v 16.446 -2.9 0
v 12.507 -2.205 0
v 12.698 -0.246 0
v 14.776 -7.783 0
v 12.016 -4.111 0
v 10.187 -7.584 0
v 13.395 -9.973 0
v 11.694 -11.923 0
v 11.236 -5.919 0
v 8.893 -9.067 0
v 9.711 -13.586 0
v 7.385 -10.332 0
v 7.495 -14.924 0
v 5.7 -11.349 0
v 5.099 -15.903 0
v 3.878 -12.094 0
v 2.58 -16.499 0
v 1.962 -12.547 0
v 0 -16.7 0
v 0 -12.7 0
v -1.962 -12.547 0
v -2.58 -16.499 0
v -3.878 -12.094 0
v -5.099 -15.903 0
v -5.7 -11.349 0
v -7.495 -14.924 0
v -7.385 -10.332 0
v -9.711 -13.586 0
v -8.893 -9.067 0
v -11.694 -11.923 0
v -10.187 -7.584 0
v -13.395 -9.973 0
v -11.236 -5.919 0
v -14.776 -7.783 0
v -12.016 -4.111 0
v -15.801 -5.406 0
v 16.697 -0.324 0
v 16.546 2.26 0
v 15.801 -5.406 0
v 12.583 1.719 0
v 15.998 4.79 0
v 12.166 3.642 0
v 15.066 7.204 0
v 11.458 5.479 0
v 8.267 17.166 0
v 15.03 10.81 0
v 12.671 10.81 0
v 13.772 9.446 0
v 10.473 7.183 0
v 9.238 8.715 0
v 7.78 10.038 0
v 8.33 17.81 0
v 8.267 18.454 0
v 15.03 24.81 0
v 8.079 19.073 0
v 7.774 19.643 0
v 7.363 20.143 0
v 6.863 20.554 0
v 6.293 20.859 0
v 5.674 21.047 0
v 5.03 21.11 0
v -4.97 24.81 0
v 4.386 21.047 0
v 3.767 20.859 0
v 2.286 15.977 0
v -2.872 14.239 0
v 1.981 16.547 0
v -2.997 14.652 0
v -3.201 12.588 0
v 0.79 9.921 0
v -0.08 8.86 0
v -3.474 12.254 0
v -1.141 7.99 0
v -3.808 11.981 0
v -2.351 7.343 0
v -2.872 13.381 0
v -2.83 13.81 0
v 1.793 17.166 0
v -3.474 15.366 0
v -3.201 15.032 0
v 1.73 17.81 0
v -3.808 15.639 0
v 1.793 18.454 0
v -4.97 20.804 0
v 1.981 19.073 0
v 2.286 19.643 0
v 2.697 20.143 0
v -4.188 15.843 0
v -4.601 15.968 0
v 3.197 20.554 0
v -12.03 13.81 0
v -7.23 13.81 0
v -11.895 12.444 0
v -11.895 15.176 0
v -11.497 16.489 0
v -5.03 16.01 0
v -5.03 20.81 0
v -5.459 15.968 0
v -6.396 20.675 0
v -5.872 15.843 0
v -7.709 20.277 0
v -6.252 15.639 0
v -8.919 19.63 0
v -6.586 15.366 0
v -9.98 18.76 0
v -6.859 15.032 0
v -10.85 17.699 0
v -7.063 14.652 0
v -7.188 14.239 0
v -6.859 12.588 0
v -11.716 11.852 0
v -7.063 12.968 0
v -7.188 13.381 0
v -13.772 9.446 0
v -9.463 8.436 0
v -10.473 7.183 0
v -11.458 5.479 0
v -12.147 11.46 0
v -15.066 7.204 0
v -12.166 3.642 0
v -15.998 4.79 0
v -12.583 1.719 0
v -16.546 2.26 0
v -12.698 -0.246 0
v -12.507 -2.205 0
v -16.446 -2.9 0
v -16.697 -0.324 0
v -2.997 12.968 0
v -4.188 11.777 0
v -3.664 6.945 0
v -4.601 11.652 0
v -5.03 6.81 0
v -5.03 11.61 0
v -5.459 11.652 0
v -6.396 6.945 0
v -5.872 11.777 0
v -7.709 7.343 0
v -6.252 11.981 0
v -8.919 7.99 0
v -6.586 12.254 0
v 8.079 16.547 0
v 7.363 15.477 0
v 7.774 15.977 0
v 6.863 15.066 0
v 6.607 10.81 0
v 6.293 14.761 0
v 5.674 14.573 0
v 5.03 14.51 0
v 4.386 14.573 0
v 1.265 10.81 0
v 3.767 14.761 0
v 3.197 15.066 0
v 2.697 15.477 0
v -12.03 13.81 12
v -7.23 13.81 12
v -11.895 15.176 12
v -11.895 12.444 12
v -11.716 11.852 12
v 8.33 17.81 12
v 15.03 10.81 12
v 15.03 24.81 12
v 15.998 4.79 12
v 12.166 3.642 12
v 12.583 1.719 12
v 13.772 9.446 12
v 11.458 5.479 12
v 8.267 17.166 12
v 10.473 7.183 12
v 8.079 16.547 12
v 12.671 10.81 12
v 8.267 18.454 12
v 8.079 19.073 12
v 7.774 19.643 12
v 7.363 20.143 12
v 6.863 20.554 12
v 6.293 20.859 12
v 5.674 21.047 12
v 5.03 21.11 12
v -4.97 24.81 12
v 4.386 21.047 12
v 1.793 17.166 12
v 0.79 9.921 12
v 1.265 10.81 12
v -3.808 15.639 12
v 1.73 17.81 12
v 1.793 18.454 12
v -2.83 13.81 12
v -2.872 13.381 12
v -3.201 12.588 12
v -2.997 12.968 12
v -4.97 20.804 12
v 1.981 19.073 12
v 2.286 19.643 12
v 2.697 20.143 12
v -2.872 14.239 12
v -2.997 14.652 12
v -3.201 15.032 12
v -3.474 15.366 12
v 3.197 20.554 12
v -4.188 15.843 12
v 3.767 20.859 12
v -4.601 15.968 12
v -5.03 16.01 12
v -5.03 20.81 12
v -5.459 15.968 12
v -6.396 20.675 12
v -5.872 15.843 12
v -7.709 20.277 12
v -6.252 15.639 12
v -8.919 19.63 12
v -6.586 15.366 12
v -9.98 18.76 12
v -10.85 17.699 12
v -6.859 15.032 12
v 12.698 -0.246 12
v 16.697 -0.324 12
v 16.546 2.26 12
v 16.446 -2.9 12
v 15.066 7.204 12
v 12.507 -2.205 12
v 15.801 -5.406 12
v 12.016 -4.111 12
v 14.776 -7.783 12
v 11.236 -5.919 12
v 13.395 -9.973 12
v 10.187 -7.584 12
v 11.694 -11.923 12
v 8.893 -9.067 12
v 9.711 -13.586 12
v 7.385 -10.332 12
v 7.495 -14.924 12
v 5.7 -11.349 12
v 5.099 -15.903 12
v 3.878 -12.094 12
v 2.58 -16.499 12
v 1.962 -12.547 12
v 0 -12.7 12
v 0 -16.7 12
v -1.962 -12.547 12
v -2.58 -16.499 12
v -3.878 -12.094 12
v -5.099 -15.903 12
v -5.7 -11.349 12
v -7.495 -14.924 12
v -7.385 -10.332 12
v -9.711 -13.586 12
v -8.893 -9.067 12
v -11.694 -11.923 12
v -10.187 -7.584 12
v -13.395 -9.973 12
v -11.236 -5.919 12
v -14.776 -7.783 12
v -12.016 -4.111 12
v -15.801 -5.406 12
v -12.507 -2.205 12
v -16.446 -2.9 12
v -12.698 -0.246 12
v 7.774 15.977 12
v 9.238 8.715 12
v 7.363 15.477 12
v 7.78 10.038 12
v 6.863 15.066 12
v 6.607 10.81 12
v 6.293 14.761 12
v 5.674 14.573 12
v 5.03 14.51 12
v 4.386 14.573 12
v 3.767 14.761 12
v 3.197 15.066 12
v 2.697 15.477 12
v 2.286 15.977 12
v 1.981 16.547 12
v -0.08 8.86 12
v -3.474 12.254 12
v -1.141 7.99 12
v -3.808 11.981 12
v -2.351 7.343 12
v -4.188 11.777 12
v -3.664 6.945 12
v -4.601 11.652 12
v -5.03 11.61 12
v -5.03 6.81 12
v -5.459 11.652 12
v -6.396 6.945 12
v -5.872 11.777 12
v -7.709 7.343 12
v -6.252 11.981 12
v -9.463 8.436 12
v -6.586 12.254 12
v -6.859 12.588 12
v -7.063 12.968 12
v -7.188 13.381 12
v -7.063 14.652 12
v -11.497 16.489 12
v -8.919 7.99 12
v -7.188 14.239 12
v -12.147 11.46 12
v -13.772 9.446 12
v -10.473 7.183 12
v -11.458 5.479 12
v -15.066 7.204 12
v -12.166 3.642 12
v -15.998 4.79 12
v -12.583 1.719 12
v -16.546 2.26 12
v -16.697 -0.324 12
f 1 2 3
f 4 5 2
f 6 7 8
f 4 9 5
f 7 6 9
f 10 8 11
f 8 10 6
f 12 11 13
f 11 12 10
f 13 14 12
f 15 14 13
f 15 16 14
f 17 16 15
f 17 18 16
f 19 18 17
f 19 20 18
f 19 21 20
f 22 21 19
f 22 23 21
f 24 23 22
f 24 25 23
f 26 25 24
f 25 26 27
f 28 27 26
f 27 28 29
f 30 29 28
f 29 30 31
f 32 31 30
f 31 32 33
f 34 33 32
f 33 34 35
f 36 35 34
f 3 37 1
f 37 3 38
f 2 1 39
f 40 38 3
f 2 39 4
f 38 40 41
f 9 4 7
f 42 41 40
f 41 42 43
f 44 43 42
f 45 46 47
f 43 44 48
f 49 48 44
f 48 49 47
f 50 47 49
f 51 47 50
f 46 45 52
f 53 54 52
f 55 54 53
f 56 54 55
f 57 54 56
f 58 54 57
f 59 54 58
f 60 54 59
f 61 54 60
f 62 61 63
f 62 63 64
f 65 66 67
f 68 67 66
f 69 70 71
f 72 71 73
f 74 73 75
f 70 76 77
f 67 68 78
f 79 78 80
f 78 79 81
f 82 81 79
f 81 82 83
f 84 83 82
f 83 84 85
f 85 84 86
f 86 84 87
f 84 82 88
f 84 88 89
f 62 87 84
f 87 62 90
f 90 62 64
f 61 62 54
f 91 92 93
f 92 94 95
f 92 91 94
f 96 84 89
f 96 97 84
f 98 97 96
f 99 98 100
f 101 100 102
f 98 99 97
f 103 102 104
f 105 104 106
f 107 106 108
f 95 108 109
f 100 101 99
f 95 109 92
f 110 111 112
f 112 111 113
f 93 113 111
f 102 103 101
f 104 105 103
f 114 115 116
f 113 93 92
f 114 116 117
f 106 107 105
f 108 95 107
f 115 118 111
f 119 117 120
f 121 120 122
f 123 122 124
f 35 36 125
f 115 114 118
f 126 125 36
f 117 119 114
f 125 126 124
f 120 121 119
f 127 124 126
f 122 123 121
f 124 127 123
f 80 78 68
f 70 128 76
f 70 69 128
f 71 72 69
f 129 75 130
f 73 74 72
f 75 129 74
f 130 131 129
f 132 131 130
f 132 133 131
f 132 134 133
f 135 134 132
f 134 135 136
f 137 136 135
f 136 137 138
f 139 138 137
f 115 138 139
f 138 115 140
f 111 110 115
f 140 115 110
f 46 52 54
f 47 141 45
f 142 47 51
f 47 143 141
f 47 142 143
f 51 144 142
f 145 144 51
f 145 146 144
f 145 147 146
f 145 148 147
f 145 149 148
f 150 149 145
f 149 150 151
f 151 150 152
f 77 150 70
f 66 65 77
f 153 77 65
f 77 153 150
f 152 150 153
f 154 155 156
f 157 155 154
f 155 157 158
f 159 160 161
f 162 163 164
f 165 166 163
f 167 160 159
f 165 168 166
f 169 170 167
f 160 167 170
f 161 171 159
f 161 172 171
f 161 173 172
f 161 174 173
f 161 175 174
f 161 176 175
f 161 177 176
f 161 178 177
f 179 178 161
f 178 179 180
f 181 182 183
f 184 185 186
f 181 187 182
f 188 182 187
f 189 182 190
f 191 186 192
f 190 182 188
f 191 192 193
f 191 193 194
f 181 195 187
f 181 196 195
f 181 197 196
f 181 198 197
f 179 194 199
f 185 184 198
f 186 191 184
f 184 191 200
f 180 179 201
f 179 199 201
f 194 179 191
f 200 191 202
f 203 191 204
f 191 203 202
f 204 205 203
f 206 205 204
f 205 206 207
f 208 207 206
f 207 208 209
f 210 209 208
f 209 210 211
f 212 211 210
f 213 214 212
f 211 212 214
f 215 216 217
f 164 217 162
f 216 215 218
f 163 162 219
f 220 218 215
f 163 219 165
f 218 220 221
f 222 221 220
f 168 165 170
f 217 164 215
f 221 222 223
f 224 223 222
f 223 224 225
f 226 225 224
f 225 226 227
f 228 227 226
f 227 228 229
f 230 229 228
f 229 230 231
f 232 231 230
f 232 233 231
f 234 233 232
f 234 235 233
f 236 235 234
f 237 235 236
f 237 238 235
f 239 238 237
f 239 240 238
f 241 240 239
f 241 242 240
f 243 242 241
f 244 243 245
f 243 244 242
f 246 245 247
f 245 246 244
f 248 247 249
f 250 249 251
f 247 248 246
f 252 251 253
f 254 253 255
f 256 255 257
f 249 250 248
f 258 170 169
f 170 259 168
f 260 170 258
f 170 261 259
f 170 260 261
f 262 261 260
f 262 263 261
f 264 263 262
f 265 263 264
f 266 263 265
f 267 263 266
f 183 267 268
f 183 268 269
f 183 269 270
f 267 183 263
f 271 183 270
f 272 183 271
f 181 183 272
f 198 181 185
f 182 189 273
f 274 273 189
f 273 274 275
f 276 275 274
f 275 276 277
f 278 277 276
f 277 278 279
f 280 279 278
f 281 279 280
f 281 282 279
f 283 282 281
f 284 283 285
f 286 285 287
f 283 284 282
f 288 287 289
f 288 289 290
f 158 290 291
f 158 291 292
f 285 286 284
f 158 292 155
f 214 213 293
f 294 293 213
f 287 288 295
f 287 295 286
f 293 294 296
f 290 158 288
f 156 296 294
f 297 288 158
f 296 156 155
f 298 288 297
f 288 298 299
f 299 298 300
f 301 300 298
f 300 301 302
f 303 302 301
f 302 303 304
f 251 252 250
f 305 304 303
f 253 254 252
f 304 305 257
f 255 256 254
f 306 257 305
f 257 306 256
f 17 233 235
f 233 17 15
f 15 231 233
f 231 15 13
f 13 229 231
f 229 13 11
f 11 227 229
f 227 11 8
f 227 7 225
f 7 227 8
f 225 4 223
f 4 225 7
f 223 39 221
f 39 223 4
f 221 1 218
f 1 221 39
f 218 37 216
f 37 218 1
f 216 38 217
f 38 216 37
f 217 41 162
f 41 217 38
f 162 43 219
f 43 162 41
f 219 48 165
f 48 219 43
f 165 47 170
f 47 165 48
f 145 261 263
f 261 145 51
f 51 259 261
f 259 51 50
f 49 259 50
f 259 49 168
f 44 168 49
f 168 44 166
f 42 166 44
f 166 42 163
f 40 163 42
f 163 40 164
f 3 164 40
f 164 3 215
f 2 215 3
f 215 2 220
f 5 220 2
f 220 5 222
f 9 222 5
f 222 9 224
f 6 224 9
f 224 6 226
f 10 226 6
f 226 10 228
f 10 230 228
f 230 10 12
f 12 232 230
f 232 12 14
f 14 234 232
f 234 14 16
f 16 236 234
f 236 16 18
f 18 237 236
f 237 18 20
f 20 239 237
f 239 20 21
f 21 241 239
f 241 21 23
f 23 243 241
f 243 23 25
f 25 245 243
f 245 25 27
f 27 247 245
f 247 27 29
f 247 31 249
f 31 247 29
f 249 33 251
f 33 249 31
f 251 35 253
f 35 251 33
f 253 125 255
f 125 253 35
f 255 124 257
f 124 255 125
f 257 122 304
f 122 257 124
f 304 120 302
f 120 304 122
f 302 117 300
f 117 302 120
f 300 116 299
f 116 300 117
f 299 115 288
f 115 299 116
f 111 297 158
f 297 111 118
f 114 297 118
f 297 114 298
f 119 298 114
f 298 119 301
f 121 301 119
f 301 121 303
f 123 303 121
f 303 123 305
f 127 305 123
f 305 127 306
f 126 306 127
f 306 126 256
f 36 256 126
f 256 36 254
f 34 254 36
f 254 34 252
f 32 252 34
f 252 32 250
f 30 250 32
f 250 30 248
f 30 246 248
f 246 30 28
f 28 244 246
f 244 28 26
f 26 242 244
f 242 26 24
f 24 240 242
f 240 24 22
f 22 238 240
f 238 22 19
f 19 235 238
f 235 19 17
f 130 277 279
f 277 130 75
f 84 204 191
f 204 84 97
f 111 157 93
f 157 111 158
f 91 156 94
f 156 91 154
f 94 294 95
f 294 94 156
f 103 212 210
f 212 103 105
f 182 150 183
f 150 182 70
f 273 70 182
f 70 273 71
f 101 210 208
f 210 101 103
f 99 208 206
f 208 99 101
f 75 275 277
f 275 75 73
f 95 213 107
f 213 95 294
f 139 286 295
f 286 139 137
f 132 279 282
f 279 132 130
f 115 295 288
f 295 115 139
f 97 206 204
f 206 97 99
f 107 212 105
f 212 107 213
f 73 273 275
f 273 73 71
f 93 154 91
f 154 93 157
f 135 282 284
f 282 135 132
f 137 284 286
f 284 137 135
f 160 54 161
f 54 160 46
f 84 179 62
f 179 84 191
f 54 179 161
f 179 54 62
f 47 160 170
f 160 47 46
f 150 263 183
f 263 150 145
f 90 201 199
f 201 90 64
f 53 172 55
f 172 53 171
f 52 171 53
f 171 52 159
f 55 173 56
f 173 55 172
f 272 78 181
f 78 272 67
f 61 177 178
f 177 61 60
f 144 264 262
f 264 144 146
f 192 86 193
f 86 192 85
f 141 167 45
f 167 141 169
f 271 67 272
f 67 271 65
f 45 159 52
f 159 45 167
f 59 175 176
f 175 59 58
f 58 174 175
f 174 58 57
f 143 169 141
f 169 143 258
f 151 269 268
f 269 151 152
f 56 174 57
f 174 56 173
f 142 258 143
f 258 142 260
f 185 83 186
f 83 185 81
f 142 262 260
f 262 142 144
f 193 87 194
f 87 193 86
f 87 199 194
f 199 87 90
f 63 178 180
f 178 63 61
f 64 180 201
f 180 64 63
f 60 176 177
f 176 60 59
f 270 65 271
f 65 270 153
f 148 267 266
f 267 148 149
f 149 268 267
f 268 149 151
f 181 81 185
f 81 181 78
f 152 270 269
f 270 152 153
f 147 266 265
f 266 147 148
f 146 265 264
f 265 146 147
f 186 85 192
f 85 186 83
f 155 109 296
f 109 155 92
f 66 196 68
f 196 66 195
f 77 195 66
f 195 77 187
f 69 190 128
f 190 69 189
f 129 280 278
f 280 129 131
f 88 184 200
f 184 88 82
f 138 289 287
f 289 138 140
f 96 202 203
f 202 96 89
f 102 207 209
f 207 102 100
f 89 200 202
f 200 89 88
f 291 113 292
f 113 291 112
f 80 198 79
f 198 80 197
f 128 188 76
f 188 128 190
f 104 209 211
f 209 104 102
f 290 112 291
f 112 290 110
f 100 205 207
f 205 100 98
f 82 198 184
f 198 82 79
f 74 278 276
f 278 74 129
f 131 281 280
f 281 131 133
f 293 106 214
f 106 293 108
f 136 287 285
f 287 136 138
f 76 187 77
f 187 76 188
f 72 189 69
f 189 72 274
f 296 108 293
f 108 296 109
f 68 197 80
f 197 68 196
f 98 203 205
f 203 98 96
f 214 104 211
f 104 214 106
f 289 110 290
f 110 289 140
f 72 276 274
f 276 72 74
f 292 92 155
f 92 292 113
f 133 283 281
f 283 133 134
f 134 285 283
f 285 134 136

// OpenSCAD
$fn = 32;

// ----------------------------------------------------------------------
// Pipe clamp: 33.4 mm ring, 4 mm wall, 12 mm wide
// ----------------------------------------------------------------------

// --- parameters (mm) ---
outer_r = 16.7;           // clamp outside radius
inner_r = 12.7;           // pipe bore radius
band = 4;                 // band thickness
clamp_w = 12;             // clamp width
opening = 40;             // opening angle between the ends
lug_w = 20;               // lug width
lug_len = 14;             // lug length
bolt_d = 6.6;             // bolt hole
knuckle_d = 14;           // hinge knuckle diameter
pin_d = 4.4;              // hinge pin hole

clamp_profile = [[-5.712, 15.693], [-8.068, 14.622], [-10.23, 13.2], [-12.147, 11.46], [-13.772, 9.446], [-15.066, 7.204], [-15.998, 4.79], [-16.546, 2.26], [-16.697, -0.324], [-16.446, -2.9], [-15.801, -5.406], [-14.776, -7.783], [-13.395, -9.973], [-11.694, -11.923], [-9.711, -13.586], [-7.495, -14.924], [-5.099, -15.903], [-2.58, -16.499], [0, -16.7], [2.58, -16.499], [5.099, -15.903], [7.495, -14.924], [9.711, -13.586], [11.694, -11.923], [13.395, -9.973], [14.776, -7.783], [15.801, -5.406], [16.446, -2.9], [16.697, -0.324], [16.546, 2.26], [15.998, 4.79], [15.066, 7.204], [13.772, 9.446], [12.147, 11.46], [10.23, 13.2], [8.068, 14.622], [5.712, 15.693], [4.344, 11.934], [6.136, 11.12], [7.78, 10.038], [9.238, 8.715], [10.473, 7.183], [11.458, 5.479], [12.166, 3.642], [12.583, 1.719], [12.698, -0.246], [12.507, -2.205], [12.016, -4.111], [11.236, -5.919], [10.187, -7.584], [8.893, -9.067], [7.385, -10.332], [5.7, -11.349], [3.878, -12.094], [1.962, -12.547], [0, -12.7], [-1.962, -12.547], [-3.878, -12.094], [-5.7, -11.349], [-7.385, -10.332], [-8.893, -9.067], [-10.187, -7.584], [-11.236, -5.919], [-12.016, -4.111], [-12.507, -2.205], [-12.698, -0.246], [-12.583, 1.719], [-12.166, 3.642], [-11.458, 5.479], [-10.473, 7.183], [-9.238, 8.715], [-7.78, 10.038], [-6.136, 11.12], [-4.344, 11.934]];

difference() {
  union() {
    linear_extrude(height = clamp_w) polygon(clamp_profile);
    /* hinge knuckle, sunk 2 mm into the band end */
    translate([-5.03, 13.81, 0]) cylinder(h = clamp_w, d = knuckle_d);
    /* bolt lug on the other end */
    translate([-4.97, 10.81, 0]) cube([lug_w, 14, clamp_w]);
  }
  translate([5.03, 17.81, -2.5]) cylinder(h = clamp_w + 5, d = bolt_d);
  translate([-5.03, 13.81, -2.5]) cylinder(h = clamp_w + 5, d = pin_d);
}
